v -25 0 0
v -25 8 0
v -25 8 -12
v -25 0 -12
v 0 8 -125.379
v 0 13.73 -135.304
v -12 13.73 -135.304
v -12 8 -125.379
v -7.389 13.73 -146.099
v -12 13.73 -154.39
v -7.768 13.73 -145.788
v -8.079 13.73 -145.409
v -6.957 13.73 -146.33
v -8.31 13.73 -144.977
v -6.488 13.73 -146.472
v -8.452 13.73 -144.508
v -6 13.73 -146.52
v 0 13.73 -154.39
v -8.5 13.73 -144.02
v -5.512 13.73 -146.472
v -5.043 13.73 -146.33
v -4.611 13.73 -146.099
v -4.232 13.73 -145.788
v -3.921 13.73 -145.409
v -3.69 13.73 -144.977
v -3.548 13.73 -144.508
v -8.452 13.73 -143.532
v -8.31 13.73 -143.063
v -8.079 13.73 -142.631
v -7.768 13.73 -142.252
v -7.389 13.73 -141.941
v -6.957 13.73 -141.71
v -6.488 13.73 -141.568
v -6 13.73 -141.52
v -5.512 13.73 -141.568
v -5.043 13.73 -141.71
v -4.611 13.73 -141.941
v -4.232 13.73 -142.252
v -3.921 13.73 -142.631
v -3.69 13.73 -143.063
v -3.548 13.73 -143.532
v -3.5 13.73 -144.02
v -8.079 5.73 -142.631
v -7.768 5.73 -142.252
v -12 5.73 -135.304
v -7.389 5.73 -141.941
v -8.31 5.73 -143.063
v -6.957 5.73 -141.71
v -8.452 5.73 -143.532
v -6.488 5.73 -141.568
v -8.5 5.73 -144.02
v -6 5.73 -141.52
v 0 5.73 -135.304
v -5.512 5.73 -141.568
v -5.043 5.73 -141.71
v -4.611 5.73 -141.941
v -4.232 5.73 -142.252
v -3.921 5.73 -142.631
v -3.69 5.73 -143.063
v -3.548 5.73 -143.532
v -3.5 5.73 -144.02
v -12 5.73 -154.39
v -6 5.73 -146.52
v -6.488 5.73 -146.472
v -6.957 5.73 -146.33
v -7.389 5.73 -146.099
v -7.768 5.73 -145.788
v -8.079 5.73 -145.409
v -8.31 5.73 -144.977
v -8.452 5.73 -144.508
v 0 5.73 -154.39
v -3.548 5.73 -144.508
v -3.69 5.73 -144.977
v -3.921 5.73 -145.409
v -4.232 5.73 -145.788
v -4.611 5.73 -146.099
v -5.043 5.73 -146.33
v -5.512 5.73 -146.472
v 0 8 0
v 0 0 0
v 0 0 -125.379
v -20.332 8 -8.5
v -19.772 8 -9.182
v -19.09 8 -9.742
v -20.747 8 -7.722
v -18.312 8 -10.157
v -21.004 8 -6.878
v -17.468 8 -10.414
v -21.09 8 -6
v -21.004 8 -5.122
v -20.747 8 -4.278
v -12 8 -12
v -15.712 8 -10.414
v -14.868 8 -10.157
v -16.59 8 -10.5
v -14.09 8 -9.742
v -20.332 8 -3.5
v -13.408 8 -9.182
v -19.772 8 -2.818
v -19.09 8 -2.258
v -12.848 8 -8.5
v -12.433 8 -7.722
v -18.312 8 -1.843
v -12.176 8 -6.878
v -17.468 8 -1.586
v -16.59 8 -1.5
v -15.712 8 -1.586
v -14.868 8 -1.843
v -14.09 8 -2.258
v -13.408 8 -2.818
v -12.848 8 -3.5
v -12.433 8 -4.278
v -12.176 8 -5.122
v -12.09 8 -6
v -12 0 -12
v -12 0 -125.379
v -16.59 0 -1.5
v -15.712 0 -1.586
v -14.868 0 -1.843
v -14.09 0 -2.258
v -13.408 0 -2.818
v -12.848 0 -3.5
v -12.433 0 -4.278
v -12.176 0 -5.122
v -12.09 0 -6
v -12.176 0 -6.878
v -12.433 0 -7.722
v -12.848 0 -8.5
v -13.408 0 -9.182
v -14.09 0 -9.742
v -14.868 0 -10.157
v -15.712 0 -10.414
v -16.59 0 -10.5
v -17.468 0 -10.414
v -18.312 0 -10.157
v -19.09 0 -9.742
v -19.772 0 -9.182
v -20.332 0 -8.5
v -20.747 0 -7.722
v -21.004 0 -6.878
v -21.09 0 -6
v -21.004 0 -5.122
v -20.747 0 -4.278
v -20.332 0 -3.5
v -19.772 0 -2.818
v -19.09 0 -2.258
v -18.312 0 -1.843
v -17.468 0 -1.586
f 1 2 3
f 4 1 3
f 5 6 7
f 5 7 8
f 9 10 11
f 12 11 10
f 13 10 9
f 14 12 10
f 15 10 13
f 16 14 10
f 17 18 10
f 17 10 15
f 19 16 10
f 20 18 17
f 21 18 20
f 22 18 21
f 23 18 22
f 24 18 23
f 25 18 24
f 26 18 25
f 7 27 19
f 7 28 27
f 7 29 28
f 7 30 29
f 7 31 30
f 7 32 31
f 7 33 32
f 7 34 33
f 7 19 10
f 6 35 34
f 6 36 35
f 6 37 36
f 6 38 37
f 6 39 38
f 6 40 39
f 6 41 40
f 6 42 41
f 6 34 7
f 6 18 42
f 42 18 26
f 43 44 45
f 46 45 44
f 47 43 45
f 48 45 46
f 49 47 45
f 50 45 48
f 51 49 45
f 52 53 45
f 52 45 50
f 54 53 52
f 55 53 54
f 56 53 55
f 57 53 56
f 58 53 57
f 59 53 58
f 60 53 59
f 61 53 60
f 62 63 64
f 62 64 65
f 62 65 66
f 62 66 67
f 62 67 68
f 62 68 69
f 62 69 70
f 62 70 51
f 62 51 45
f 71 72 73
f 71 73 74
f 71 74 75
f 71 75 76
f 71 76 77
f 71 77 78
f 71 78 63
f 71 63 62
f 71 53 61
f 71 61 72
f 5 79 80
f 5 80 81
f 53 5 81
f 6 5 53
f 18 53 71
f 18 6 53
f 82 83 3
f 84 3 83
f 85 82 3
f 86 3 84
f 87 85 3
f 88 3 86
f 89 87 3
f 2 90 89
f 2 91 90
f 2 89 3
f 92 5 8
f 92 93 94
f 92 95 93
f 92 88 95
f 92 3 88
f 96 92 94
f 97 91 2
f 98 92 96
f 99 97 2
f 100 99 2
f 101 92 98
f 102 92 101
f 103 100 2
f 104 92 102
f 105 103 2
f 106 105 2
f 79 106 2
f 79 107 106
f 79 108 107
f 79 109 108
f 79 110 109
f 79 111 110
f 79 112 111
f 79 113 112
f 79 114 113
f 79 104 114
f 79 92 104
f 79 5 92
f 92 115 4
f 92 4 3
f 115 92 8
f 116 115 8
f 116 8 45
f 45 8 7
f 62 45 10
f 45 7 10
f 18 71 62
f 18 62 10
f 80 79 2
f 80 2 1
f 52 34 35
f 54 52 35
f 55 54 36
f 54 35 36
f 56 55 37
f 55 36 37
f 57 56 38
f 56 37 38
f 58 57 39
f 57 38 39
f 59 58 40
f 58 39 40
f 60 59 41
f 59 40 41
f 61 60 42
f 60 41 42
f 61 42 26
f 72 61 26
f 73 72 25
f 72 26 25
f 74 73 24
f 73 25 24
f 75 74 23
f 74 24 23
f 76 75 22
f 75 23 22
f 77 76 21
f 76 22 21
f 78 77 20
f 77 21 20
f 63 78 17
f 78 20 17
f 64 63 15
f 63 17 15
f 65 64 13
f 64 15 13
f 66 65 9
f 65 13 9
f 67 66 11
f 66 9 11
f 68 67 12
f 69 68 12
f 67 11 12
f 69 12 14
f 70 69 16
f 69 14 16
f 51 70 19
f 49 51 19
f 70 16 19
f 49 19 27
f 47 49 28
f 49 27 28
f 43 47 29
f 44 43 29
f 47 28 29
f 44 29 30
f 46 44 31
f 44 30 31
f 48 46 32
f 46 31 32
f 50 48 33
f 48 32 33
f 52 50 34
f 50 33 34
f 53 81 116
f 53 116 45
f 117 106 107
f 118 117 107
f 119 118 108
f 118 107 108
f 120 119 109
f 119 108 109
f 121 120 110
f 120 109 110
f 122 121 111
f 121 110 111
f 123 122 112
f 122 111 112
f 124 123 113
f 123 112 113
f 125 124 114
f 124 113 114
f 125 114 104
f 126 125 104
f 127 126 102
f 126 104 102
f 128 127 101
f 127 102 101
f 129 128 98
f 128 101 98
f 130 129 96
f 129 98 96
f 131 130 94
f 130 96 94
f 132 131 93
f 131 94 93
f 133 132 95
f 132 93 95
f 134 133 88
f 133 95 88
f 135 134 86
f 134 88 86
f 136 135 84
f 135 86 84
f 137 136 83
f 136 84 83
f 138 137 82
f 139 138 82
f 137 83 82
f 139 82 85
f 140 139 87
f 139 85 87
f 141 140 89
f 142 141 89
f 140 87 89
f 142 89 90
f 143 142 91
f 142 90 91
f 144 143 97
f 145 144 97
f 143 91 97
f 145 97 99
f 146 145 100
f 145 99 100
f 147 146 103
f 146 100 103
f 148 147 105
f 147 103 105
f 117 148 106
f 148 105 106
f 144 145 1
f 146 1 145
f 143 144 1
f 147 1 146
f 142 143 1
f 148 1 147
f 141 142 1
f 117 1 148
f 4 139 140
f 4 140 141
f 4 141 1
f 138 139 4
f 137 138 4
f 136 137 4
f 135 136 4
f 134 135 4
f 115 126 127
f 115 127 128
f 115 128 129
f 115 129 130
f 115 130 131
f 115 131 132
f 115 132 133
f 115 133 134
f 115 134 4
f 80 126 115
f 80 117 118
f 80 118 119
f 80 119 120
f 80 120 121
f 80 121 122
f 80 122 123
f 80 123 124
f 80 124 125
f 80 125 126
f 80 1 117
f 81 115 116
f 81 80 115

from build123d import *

# Parameters (mm, degrees)
BOSS_EXTRUDE1_DEPTH = 12
SKETCH1_3_W         = 12
SKETCH1_3_H         = 8
BOSS_EXTRUDE2_DEPTH = 25
SKETCH2_R           = 4.5
CUT_EXTRUDE1_DEPTH  = 8
SKETCH4_R           = 2.5
CUT_EXTRUDE2_DEPTH  = 8


with BuildPart() as part:
    # Sketch1 → Boss-Extrude1 (new body)
    with BuildSketch(Plane(origin=(0, 0, 0), x_dir=(0, 0, -1), z_dir=(1, 0, 0))):
        Polygon((0, 0), (125.37946203, 0), (135.304113157, 5.73), (154.39, 5.73), (154.39, 13.73), (135.304113157, 13.73), (125.37946203, 8), (0, 8), align=None)
    extrude(amount=-BOSS_EXTRUDE1_DEPTH)

    # Sketch1<3> → Boss-Extrude2 (add)
    with BuildSketch(Plane(origin=(0, 0, 0), x_dir=(0, 0, -1), z_dir=(1, 0, 0))):
        with Locations((6, 4)):
            Rectangle(SKETCH1_3_W, SKETCH1_3_H)
    extrude(amount=-BOSS_EXTRUDE2_DEPTH)

    # Sketch2 → Cut-Extrude1 (cut)
    with BuildSketch(Plane(origin=(0, 8, 0), x_dir=(1, 0, 0), z_dir=(0, 1, 0))):
        with Locations(Location((-16.59, 6, 0), (0, 0, 270))):
            Circle(SKETCH2_R)
    extrude(amount=-CUT_EXTRUDE1_DEPTH, mode=Mode.SUBTRACT)

    # Sketch4 → Cut-Extrude2 (cut)
    with BuildSketch(Plane(origin=(0, 13.73, 0), x_dir=(1, 0, 0), z_dir=(0, 1, 0))):
        with Locations(Location((-6, 144.02, 0), (0, 0, 270))):
            Circle(SKETCH4_R)
    extrude(amount=-CUT_EXTRUDE2_DEPTH, mode=Mode.SUBTRACT)


solid = part.part
